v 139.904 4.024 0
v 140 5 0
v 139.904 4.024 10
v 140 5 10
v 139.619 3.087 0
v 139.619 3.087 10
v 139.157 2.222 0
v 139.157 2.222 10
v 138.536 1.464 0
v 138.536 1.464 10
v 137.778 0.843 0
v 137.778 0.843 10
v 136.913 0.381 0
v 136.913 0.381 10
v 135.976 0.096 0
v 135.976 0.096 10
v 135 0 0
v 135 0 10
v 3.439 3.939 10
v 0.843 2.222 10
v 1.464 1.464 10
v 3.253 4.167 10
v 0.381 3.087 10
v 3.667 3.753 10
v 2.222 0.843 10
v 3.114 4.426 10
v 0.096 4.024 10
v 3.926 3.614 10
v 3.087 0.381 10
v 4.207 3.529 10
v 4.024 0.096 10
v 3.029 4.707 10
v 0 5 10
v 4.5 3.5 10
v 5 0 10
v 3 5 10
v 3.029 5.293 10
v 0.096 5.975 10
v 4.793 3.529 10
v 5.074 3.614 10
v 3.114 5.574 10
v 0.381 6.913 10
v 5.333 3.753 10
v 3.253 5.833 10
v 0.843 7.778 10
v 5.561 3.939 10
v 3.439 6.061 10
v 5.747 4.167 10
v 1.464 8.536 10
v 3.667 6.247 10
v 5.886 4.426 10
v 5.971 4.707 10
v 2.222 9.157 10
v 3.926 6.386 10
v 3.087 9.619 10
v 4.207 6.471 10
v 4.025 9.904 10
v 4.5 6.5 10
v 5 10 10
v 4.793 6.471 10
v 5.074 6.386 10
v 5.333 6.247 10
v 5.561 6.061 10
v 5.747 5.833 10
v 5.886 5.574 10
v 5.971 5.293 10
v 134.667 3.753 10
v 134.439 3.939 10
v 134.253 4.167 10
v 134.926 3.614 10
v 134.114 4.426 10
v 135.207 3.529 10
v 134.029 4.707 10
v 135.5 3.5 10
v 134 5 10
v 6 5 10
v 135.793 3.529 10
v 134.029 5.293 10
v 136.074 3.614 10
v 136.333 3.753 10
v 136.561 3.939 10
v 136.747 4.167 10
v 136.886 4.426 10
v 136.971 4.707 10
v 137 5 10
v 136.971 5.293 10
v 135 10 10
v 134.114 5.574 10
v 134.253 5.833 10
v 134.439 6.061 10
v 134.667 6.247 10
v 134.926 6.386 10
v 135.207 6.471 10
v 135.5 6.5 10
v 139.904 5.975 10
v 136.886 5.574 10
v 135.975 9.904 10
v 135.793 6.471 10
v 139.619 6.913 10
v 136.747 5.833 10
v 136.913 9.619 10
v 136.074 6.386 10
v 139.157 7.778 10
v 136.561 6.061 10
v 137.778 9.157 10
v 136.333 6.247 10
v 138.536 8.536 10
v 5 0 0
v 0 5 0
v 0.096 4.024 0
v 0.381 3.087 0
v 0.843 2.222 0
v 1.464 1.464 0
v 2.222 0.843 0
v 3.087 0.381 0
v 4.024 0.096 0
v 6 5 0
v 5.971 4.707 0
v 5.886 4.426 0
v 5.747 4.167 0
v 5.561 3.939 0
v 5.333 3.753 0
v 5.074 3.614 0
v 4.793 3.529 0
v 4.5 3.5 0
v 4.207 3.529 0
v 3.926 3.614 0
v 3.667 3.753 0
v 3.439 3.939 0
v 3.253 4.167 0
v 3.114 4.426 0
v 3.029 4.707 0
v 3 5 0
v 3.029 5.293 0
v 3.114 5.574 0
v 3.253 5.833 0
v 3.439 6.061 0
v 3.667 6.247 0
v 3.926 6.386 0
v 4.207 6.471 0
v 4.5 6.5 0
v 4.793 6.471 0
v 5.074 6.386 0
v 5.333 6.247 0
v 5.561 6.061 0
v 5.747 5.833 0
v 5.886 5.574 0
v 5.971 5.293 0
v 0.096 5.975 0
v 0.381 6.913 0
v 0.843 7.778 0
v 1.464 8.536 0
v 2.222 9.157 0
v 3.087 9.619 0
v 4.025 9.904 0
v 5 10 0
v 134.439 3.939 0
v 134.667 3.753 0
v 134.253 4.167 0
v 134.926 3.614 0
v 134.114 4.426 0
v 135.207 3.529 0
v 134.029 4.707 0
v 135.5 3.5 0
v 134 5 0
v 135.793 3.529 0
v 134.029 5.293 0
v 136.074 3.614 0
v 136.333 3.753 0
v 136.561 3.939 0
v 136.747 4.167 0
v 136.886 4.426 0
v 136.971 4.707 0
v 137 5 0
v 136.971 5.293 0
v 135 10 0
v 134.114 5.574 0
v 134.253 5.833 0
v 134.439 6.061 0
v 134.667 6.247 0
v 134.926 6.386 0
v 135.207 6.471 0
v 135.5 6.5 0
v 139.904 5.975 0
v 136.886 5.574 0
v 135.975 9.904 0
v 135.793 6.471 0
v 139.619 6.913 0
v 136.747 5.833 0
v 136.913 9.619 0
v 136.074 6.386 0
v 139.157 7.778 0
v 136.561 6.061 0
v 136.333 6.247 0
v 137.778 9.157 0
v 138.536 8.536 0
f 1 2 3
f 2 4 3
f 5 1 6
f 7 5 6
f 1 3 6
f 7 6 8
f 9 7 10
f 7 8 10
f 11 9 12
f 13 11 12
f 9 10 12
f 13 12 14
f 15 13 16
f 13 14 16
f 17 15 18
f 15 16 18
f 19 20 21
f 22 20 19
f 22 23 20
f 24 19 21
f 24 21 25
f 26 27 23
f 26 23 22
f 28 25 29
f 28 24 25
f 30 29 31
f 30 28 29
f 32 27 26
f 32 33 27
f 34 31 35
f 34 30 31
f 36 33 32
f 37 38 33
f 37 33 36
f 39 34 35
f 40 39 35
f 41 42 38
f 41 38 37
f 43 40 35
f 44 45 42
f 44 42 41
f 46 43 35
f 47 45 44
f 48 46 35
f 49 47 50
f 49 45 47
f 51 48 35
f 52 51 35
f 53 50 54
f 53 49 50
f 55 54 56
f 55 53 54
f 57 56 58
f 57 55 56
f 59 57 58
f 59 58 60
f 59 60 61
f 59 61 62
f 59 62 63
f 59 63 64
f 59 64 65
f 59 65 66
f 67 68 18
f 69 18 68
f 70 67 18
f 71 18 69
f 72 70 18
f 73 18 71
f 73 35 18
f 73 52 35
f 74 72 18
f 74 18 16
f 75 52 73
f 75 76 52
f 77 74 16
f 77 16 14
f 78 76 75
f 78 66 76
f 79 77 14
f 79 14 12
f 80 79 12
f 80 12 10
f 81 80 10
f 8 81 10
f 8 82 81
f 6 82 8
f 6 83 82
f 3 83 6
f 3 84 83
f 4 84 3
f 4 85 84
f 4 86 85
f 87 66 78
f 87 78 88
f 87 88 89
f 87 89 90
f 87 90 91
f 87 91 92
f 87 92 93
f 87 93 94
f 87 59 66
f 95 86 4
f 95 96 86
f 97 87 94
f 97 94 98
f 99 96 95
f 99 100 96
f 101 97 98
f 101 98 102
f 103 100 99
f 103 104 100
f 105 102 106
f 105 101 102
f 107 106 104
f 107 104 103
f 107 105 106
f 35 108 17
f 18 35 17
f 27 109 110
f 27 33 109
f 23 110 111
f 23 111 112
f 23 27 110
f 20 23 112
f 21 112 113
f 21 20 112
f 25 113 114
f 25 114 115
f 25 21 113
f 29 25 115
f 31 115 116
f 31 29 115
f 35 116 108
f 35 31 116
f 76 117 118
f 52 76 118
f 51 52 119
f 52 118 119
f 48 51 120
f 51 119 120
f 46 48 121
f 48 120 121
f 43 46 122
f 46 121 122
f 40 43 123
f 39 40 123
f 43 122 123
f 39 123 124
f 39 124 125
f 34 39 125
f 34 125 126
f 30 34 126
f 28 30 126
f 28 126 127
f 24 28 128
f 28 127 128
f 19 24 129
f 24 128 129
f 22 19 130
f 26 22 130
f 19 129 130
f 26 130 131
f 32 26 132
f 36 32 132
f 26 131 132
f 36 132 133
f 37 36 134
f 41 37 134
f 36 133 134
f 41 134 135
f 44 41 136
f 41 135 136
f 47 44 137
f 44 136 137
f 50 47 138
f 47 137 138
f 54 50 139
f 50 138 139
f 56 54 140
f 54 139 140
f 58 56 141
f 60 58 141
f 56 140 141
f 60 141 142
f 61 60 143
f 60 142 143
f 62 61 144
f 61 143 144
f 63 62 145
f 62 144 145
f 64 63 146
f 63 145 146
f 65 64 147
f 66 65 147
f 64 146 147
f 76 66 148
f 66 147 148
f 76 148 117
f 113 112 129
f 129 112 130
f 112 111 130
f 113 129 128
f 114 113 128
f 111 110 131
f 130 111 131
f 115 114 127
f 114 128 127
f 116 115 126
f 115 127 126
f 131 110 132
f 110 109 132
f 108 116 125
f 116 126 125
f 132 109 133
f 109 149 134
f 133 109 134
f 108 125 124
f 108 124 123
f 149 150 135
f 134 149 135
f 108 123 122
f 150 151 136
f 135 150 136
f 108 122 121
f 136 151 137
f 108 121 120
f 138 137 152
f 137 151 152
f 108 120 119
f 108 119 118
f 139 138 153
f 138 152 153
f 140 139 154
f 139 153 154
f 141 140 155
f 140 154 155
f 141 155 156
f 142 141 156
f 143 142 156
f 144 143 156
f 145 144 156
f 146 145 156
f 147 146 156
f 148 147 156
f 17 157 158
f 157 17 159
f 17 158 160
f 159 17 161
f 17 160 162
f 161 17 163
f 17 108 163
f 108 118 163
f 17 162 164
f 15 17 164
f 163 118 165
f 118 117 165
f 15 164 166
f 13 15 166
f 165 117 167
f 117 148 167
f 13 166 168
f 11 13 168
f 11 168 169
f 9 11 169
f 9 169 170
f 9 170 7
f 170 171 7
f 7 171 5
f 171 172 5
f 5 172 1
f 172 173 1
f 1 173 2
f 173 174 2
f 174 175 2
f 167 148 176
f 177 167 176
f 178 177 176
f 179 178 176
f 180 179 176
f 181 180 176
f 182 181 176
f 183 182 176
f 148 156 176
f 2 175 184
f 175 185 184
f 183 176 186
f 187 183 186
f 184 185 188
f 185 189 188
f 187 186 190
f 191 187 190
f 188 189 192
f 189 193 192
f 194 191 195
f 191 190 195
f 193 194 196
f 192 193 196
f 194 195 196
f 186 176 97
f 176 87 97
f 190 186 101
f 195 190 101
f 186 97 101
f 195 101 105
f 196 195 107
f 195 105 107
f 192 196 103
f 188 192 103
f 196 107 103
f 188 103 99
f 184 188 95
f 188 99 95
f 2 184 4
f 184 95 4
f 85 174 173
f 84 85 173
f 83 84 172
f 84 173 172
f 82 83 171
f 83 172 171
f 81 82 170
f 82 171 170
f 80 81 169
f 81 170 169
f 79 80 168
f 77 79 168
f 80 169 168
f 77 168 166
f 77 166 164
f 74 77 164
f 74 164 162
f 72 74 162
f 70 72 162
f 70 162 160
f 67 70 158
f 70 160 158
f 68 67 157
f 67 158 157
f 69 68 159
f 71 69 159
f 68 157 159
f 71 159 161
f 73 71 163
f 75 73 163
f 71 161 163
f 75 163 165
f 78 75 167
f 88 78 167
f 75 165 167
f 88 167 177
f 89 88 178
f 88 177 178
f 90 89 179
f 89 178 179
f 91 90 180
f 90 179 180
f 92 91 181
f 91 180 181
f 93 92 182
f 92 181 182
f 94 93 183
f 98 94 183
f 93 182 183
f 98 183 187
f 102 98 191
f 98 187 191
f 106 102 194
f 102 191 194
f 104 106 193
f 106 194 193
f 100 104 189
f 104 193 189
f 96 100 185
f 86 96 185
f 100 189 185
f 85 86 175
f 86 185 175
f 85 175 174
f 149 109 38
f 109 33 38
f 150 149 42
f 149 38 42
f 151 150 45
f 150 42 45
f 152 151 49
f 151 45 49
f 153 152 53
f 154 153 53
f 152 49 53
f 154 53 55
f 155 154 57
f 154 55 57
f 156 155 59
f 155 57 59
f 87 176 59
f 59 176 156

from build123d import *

# Parameters (mm, degrees)
BOSS_EXTRUDE1_DEPTH = 10
FILLET1_R           = 5
FILLET2_R           = 5
FILLET3_R           = 5
FILLET4_R           = 5


with BuildPart() as part:
    # Sketch1 → Boss-Extrude1 (new body)
    with BuildSketch(Plane.XY):
        with BuildLine():
            Line((0, 10), (0, 5))
            Line((0, 5), (3, 5))
            ThreePointArc((3, 5), (4.5, 6.5), (6, 5))
            Line((6, 5), (134, 5))
            ThreePointArc((134, 5), (135.5, 6.5), (137, 5))
            Line((137, 5), (140, 5))
            Line((140, 5), (140, 10))
            Line((140, 10), (0, 10))
        make_face()
        with BuildLine():
            Line((3, 5), (0, 5))
            Line((0, 5), (0, 0))
            Line((0, 0), (140, 0))
            Line((140, 0), (140, 5))
            Line((140, 5), (137, 5))
            ThreePointArc((137, 5), (135.5, 3.5), (134, 5))
            Line((134, 5), (6, 5))
            ThreePointArc((6, 5), (4.5, 3.5), (3, 5))
        make_face()
    extrude(amount=BOSS_EXTRUDE1_DEPTH)

    # Fillet1
    fillet1_edges = [part.edges().sort_by_distance(p)[0] for p in [
        (0, 10, 5),
    ]]
    fillet(fillet1_edges, radius=FILLET1_R)

    # Fillet2
    fillet2_edges = [part.edges().sort_by_distance(p)[0] for p in [
        (0, 0, 5),
    ]]
    fillet(fillet2_edges, radius=FILLET2_R - 0.0001)  # a hair under: the kernel refuses the full size

    # Fillet3
    fillet3_edges = [part.edges().sort_by_distance(p)[0] for p in [
        (140, 10, 5),
    ]]
    fillet(fillet3_edges, radius=FILLET3_R)

    # Fillet4
    fillet4_edges = [part.edges().sort_by_distance(p)[0] for p in [
        (140, 0, 5),
    ]]
    fillet(fillet4_edges, radius=FILLET4_R - 0.0001)  # a hair under: the kernel refuses the full size


solid = part.part
